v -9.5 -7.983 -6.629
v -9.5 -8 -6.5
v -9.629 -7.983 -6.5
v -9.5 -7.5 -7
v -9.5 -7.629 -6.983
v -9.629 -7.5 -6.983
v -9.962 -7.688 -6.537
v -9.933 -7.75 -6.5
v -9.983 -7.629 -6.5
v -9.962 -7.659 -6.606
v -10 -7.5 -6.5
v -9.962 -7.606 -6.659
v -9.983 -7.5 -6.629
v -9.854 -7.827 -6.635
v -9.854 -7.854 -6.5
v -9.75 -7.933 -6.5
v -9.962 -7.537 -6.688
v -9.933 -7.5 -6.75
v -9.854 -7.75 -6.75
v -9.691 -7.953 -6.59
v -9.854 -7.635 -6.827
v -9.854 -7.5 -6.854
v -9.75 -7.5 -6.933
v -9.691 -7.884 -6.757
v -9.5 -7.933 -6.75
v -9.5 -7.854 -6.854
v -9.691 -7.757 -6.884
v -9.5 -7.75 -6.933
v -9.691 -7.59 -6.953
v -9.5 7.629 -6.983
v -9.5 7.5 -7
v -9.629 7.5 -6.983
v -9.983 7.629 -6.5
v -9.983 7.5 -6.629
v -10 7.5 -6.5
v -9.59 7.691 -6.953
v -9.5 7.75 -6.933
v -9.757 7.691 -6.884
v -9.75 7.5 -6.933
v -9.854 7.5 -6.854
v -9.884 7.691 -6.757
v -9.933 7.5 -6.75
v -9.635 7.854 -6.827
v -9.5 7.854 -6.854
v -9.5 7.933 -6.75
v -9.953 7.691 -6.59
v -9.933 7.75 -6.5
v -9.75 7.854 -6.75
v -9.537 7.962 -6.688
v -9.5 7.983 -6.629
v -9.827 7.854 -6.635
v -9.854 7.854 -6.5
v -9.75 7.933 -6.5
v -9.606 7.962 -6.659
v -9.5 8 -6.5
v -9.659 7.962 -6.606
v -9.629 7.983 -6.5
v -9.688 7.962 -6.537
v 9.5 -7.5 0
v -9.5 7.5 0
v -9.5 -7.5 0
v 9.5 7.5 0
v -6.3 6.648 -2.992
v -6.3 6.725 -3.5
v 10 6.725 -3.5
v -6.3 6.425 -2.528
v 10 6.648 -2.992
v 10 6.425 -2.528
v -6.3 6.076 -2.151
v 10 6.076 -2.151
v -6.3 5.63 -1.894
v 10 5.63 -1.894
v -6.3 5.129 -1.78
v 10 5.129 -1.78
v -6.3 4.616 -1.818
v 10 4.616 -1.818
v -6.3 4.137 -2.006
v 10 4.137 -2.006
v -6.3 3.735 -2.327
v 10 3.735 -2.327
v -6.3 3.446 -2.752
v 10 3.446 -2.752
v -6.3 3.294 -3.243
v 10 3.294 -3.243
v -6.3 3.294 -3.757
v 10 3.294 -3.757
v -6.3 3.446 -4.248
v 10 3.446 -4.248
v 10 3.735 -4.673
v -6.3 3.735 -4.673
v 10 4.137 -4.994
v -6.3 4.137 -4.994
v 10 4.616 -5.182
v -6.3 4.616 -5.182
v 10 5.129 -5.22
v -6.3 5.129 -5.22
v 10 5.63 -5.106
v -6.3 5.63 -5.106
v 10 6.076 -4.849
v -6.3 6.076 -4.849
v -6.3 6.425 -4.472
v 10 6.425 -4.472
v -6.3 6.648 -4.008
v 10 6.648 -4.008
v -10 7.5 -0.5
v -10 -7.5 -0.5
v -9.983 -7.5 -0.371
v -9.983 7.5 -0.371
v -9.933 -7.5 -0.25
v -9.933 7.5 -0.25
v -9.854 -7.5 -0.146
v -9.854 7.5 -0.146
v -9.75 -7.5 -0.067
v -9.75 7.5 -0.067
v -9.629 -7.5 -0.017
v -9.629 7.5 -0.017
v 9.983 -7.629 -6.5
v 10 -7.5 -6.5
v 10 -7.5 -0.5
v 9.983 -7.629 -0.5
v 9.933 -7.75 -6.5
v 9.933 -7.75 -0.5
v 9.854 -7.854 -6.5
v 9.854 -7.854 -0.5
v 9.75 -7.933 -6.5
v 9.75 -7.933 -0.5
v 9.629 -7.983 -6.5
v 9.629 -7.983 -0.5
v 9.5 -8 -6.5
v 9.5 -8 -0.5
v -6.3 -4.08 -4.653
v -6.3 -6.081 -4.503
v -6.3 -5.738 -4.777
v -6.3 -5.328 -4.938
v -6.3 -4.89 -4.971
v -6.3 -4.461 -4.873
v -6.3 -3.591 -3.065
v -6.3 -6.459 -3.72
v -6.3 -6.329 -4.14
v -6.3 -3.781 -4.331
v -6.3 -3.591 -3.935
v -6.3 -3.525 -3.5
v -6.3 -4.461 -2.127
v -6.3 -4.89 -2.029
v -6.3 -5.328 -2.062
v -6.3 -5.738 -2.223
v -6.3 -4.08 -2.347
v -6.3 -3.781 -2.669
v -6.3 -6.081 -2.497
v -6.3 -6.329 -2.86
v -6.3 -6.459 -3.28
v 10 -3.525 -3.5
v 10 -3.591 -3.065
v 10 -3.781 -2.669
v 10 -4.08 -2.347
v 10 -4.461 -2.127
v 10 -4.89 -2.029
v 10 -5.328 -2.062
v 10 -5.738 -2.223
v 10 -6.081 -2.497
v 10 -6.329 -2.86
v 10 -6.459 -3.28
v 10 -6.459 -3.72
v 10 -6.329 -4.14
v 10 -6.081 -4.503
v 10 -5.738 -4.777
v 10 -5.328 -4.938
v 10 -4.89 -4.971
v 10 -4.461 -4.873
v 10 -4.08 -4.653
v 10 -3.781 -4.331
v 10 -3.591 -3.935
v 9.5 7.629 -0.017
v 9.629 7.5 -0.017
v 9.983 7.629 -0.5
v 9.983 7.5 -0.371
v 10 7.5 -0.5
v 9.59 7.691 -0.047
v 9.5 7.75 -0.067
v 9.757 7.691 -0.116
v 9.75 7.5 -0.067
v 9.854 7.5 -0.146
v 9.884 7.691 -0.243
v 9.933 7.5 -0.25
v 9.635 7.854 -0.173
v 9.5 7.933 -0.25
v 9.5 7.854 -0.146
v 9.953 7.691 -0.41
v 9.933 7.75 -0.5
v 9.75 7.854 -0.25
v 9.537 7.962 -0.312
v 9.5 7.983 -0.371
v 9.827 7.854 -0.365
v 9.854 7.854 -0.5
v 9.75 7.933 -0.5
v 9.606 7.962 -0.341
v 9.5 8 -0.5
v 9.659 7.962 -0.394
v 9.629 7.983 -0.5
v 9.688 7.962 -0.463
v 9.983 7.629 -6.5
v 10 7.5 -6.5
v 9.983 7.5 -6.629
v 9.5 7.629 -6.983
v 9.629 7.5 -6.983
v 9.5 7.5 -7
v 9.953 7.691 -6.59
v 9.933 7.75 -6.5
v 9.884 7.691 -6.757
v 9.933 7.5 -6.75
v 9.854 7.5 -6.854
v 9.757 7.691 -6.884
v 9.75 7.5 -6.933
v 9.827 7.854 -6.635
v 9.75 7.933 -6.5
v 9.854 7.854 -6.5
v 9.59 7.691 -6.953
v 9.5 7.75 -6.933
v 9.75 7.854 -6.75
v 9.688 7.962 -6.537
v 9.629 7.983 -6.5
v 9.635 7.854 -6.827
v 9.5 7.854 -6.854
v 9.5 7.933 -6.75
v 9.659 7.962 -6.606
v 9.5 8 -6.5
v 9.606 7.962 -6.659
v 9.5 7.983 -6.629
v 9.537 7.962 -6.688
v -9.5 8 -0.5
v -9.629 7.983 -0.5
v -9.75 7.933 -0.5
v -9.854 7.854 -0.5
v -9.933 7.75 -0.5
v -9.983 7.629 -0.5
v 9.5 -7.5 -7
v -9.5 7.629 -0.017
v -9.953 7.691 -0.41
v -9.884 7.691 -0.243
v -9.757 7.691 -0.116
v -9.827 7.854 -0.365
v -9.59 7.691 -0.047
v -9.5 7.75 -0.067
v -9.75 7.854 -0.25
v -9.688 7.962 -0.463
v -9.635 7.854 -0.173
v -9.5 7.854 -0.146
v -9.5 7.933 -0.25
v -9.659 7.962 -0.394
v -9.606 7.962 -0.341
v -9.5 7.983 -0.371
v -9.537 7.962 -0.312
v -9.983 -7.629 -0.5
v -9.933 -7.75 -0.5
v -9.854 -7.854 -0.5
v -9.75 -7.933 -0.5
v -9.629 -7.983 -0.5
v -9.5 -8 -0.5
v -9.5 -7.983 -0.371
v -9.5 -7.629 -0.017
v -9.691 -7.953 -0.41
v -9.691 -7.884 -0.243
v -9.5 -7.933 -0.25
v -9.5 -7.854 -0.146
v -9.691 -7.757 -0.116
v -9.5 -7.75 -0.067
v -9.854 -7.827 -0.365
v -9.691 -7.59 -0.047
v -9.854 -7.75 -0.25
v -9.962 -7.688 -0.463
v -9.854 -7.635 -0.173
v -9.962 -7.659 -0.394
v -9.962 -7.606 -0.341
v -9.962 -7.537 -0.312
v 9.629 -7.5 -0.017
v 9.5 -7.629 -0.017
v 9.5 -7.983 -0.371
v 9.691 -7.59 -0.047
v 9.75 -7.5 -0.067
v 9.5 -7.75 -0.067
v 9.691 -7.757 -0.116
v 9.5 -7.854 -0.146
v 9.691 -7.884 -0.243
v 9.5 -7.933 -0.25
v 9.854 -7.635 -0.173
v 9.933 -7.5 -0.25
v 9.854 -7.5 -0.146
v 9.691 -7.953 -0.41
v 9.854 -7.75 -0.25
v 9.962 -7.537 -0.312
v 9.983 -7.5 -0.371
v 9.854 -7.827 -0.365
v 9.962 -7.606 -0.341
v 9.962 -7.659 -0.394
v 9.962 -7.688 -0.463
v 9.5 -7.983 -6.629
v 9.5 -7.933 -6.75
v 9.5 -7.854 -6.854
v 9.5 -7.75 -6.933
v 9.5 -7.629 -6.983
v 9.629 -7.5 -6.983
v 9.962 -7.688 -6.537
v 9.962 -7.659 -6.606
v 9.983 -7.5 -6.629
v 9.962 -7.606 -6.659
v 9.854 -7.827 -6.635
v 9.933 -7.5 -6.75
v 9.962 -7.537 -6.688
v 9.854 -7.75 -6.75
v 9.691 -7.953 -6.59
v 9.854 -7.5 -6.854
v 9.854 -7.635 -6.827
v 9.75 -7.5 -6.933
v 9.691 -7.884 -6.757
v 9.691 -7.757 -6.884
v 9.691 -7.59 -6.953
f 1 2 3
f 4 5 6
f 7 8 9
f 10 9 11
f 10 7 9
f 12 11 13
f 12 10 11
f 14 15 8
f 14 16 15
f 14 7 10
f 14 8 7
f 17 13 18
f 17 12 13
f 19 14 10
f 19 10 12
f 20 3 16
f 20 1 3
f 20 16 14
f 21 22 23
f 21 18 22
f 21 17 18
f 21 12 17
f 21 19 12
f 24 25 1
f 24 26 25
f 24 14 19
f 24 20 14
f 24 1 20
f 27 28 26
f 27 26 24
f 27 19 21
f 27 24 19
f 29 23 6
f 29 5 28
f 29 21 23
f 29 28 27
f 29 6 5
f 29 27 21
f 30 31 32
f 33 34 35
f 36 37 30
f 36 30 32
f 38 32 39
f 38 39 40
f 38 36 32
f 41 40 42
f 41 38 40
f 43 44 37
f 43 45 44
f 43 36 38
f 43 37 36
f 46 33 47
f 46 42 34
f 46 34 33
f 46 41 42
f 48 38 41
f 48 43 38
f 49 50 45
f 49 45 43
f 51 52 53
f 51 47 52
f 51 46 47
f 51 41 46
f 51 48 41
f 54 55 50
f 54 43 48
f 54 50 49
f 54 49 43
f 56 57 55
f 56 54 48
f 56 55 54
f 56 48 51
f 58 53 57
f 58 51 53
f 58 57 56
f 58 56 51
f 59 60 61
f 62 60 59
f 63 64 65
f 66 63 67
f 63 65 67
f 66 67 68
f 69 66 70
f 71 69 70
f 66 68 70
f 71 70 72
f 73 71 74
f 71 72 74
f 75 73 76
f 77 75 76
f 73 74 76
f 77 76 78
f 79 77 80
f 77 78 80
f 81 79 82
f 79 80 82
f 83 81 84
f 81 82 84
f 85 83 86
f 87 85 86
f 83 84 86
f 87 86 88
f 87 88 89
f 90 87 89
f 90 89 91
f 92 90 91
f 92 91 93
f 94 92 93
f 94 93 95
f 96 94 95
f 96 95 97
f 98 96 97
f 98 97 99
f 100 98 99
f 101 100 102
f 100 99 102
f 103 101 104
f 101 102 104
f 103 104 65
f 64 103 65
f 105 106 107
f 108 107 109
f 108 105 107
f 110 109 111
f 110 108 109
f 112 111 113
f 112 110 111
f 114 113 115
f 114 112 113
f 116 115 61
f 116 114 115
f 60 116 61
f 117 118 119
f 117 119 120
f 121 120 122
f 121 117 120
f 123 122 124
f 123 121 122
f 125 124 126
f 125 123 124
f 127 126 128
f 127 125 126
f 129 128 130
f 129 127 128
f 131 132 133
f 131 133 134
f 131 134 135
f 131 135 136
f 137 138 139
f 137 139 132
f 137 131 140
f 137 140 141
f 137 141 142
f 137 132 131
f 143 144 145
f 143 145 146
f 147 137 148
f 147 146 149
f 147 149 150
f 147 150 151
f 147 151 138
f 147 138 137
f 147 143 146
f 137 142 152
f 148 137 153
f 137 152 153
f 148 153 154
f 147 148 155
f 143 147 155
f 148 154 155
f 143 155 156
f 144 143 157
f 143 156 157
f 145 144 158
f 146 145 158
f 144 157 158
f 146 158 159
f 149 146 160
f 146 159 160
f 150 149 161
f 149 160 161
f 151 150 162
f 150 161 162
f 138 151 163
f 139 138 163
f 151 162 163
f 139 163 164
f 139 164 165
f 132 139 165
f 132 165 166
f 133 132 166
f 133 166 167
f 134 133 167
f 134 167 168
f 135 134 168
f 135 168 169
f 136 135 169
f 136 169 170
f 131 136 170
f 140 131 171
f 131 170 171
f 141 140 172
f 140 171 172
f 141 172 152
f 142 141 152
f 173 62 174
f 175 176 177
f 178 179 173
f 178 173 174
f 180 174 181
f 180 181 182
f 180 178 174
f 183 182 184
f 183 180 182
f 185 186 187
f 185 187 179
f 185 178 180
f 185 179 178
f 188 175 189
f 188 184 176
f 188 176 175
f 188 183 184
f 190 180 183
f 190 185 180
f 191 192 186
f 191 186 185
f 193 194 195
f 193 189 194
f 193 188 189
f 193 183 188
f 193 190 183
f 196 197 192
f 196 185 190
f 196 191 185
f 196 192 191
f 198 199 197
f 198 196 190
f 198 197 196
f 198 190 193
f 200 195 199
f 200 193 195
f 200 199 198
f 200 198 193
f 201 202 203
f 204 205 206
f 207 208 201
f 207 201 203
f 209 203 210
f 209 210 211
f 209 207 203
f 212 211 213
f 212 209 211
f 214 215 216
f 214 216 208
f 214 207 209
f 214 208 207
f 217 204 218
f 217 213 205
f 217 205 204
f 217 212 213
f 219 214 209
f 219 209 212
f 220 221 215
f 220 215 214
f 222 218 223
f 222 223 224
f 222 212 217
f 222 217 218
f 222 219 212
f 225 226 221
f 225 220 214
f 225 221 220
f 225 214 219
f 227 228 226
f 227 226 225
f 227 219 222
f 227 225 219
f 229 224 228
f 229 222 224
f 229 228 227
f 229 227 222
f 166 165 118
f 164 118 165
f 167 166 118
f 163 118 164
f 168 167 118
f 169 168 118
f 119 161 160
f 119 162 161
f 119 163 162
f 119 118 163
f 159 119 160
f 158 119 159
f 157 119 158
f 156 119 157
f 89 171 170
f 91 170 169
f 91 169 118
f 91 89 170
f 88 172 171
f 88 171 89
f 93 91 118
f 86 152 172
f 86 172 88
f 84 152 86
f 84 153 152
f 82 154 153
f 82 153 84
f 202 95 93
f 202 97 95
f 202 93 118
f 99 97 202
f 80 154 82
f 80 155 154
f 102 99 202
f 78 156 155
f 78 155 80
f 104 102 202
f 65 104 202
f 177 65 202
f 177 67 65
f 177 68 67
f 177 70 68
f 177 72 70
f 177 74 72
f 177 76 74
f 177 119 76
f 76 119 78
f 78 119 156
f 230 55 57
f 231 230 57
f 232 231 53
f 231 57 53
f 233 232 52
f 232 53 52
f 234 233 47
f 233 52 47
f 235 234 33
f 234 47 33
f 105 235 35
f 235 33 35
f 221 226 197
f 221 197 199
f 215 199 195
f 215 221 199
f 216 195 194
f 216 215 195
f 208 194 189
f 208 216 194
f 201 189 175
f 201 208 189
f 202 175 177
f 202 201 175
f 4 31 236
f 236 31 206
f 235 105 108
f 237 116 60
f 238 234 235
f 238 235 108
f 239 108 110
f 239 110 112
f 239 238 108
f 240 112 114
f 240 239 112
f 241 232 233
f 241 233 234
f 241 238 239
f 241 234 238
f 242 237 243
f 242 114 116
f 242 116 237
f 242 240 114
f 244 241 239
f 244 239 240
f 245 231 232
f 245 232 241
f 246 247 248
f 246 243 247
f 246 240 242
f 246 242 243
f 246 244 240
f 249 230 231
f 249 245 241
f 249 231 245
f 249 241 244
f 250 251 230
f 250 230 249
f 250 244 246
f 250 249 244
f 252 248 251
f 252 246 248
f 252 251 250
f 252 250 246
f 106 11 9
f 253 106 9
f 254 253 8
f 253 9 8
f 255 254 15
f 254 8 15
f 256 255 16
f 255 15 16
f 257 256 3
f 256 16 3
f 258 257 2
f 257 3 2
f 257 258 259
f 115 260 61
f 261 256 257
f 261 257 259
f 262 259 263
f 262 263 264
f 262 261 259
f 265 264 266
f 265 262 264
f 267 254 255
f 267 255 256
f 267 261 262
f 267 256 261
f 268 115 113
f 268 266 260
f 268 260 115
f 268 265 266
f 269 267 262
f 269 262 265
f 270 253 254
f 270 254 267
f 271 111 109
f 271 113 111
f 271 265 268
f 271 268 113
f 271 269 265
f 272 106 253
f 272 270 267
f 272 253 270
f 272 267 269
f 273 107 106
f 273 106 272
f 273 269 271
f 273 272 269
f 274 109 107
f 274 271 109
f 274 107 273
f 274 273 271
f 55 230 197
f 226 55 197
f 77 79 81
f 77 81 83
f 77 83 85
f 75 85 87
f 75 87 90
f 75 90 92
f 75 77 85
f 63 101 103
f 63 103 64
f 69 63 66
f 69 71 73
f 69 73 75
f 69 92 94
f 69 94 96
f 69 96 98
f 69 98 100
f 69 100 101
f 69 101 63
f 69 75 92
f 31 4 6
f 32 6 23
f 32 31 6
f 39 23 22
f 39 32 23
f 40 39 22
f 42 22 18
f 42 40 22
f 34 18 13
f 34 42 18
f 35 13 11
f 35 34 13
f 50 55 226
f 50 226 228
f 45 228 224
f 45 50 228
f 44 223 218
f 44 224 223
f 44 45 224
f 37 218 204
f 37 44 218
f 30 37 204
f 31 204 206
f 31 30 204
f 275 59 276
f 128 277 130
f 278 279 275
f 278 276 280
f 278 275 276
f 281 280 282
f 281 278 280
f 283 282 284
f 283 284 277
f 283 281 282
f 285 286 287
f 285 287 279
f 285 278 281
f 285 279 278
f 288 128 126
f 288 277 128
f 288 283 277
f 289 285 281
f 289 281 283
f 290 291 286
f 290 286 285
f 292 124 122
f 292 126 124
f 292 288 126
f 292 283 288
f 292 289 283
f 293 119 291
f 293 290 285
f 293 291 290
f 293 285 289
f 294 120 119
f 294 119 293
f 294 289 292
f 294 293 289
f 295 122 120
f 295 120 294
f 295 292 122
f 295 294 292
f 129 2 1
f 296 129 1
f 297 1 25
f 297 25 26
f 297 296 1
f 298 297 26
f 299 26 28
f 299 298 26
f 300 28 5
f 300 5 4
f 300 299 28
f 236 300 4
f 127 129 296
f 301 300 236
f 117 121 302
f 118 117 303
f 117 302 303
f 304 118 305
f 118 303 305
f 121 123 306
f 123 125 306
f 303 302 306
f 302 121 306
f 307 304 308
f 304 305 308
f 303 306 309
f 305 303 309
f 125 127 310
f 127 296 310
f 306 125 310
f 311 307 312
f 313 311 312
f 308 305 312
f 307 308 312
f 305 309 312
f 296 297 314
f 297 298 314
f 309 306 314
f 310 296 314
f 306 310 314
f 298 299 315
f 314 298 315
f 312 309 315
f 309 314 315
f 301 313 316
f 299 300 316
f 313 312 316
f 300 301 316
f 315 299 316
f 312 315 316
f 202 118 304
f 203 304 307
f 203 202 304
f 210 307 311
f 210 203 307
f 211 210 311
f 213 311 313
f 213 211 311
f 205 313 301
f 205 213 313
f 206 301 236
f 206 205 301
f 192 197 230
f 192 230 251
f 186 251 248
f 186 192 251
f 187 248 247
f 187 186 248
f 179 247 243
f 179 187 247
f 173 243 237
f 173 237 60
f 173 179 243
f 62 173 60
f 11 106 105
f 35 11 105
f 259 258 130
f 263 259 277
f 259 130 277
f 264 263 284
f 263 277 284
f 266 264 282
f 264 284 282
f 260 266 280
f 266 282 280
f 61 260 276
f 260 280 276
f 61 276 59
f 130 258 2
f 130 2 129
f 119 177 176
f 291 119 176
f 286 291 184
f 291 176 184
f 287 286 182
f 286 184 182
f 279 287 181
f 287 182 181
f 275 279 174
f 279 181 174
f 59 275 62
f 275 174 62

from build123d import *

# Parameters (mm, degrees)
F0_W         = 20
F0_H         = 16
F1_DEPTH     = 7
F2_R         = 0.5
F3_T1_DEPTH  = 22.5
F3_T3_DEPTH  = 16.75
F3_T5_DEPTH  = 6
F3_S9_W      = 0.5
F3_S9_H      = 0.5
F3_T10_DEPTH = 0.5
F3_S15_W     = 0.5
F3_S15_H     = 0.5
F3_T16_DEPTH = 0.5
F3_T20_ANGLE = 90
F3_T22_ANGLE = 90
F4_T1_DEPTH  = 6
F4_S5_W      = 0.5
F4_S5_H      = 0.5
F4_T6_DEPTH  = 0.5
F4_S11_W     = 0.5
F4_S11_H     = 0.5
F4_T12_DEPTH = 0.5
F5_T1_DEPTH  = 6
F5_S5_W      = 0.5
F5_S5_H      = 0.5
F5_T6_DEPTH  = 0.5
F5_S11_W     = 0.5
F5_S11_H     = 0.5
F5_T12_DEPTH = 0.5
F6_R         = 1.475
F6_R_2       = 1.725
F7_DEPTH     = 16.3


# Not quite as in the source:
# - a fillet or chamfer that OpenCascade refuses, or shapes differently, is made with other operations: its cross-section is extruded or revolved along the edge and cut away or added


with BuildPart() as f1:
    # F0 (on Top) → F1 (new body)
    with BuildSketch(Plane.XY):
        Rectangle(F0_W, F0_H)
    extrude(amount=-F1_DEPTH)

    # F2
    f2_edges = [f1.edges().sort_by_distance(p)[0] for p in [
        (0, 8, 0),
        (-10, 0, 0),
        (0, -8, 0),
        (10, 0, 0),
        (0, -8, -7),
    ]]
    fillet(f2_edges, radius=F2_R)

    # F3: fillet of radius 0.5 on 4 edges, made by hand

    # F3_s2 → F3_t1 (cut)
    with BuildSketch(Plane.YZ.offset(-11.25)):
        with BuildLine():
            ThreePointArc((8, -6.5), (7.8535533906, -6.8535533906), (7.5, -7))
            Line((7.5, -7), (8, -7))
            Line((8, -7), (8, -6.5))
        make_face()
    extrude(amount=F3_T1_DEPTH, mode=Mode.SUBTRACT)

    # F3_s4 → F3_t3 (cut)
    with BuildSketch(Plane.XZ.offset(-9.25)):
        with BuildLine():
            ThreePointArc((-9.5, -7), (-9.8535533906, -6.8535533906), (-10, -6.5))
            Line((-10, -6.5), (-10, -7))
            Line((-10, -7), (-9.5, -7))
        make_face()
        with BuildLine():
            ThreePointArc((10, -6.5), (9.8535533906, -6.8535533906), (9.5, -7))
            Line((9.5, -7), (10, -7))
            Line((10, -7), (10, -6.5))
        make_face()
    extrude(amount=F3_T3_DEPTH, mode=Mode.SUBTRACT)

    # F3_s6 → F3_t5 (cut)
    with BuildSketch(Plane.XY.offset(-6.5)):
        with BuildLine():
            ThreePointArc((10, -7.5), (9.8535533906, -7.8535533906), (9.5, -8))
            Line((9.5, -8), (10, -8))
            Line((10, -8), (10, -7.5))
        make_face()
        with BuildLine():
            ThreePointArc((-10, -7.5), (-9.8535533906, -7.8535533906), (-9.5, -8))
            Line((-9.5, -8), (-10, -8))
            Line((-10, -8), (-10, -7.5))
        make_face()
    extrude(amount=F3_T5_DEPTH, mode=Mode.SUBTRACT)


with BuildPart() as f3_tool8:
    # F3_s9 → F3_t10 (new body)
    with BuildSketch(Plane.YZ.offset(9.5)):
        with Locations((-7.75, -0.25)):
            Rectangle(F3_S9_W, F3_S9_H)
    extrude(amount=F3_T10_DEPTH)

    # F3_s11 → F3_t12 (revolve, cut)
    with BuildSketch(Plane(origin=(9.5, -7.5, -0.5), x_dir=(0, 0.7071067812, -0.7071067812), z_dir=(0, -0.7071067812, -0.7071067812))):
        with BuildLine():
            ThreePointArc((0, -0.5), (0.5, 0), (0, 0.5))
            Line((0, 0.5), (0, -0.5))
        make_face()
    revolve(axis=Axis((9.5, -7.5, -0.5), (1, 0, 0)), mode=Mode.SUBTRACT)


with BuildPart() as f1_1:
    add(f1.part)

    # F3_t7: cut F3_tool8
    add(f3_tool8.part, mode=Mode.SUBTRACT)


with BuildPart() as f3_tool14:
    # F3_s15 → F3_t16 (new body)
    with BuildSketch(Plane.YZ.offset(-9.5)):
        with Locations((-7.75, -0.25)):
            Rectangle(F3_S15_W, F3_S15_H)
    extrude(amount=-F3_T16_DEPTH)

    # F3_s17 → F3_t18 (revolve, cut)
    with BuildSketch(Plane(origin=(-9.5, -7.5, -0.5), x_dir=(0, 0.7071067812, -0.7071067812), z_dir=(0, 0.7071067812, 0.7071067812))):
        with BuildLine():
            ThreePointArc((0, -0.5), (0.5, 0), (0, 0.5))
            Line((0, 0.5), (0, -0.5))
        make_face()
    revolve(axis=Axis((-9.5, -7.5, -0.5), (-1, 0, 0)), mode=Mode.SUBTRACT)


with BuildPart() as f1_2:
    add(f1_1.part)

    # F3_t13: cut F3_tool14
    add(f3_tool14.part, mode=Mode.SUBTRACT)

    # F3_s19 → F3_t20 (revolve, cut)
    with BuildSketch(Plane.XY.offset(-6.5)):
        with BuildLine():
            ThreePointArc((10, -7.5), (9.8535533906, -7.8535533906), (9.5, -8))
            Line((9.5, -8), (10, -8))
            Line((10, -8), (10, -7.5))
        make_face()
    revolve(axis=Axis((10, -7.5, -6.5), (1, 0, 0)), revolution_arc=F3_T20_ANGLE, mode=Mode.SUBTRACT)

    # F3_s21 → F3_t22 (revolve, cut)
    with BuildSketch(Plane.XY.offset(-6.5)):
        with BuildLine():
            ThreePointArc((-10, -7.5), (-9.8535533906, -7.8535533906), (-9.5, -8))
            Line((-9.5, -8), (-10, -8))
            Line((-10, -8), (-10, -7.5))
        make_face()
    revolve(axis=Axis((-10, -7.5, -6.5), (1, 0, 0)), revolution_arc=F3_T22_ANGLE, mode=Mode.SUBTRACT)

    # F4: fillet of radius 0.5 on 1 edges, made by hand

    # F4_s2 → F4_t1 (cut)
    with BuildSketch(Plane.XY.offset(-6.5)):
        with BuildLine():
            ThreePointArc((-9.5, 8), (-9.8535533906, 7.8535533906), (-10, 7.5))
            Line((-10, 7.5), (-10, 8))
            Line((-10, 8), (-9.5, 8))
        make_face()
    extrude(amount=F4_T1_DEPTH, mode=Mode.SUBTRACT)


with BuildPart() as f4_tool4:
    # F4_s5 → F4_t6 (new body)
    with BuildSketch(Plane.XZ.offset(-7.5)):
        with Locations((-9.75, -0.25)):
            Rectangle(F4_S5_W, F4_S5_H)
    extrude(amount=-F4_T6_DEPTH)

    # F4_s7 → F4_t8 (revolve, cut)
    with BuildSketch(Plane(origin=(-9.5, 7.5, -0.5), x_dir=(0.7071067812, 0, -0.7071067812), z_dir=(0.7071067812, 0, 0.7071067812))):
        with BuildLine():
            ThreePointArc((0, -0.5), (0.5, 0), (0, 0.5))
            Line((0, 0.5), (0, -0.5))
        make_face()
    revolve(axis=Axis((-9.5, 7.5, -0.5), (0, 1, 0)), mode=Mode.SUBTRACT)


with BuildPart() as f1_3:
    add(f1_2.part)

    # F4_t3: cut F4_tool4
    add(f4_tool4.part, mode=Mode.SUBTRACT)


with BuildPart() as f4_tool10:
    # F4_s11 → F4_t12 (new body)
    with BuildSketch(Plane.XZ.offset(-7.5)):
        with Locations((-9.75, -6.75)):
            Rectangle(F4_S11_W, F4_S11_H)
    extrude(amount=-F4_T12_DEPTH)

    # F4_s13 → F4_t14 (revolve, cut)
    with BuildSketch(Plane(origin=(-9.5, 7.5, -6.5), x_dir=(0.7071067812, 0, 0.7071067812), z_dir=(-0.7071067812, 0, 0.7071067812))):
        with BuildLine():
            ThreePointArc((0, -0.5), (0.5, 0), (0, 0.5))
            Line((0, 0.5), (0, -0.5))
        make_face()
    revolve(axis=Axis((-9.5, 7.5, -6.5), (0, 1, 0)), mode=Mode.SUBTRACT)


with BuildPart() as f1_4:
    add(f1_3.part)

    # F4_t9: cut F4_tool10
    add(f4_tool10.part, mode=Mode.SUBTRACT)

    # F5: fillet of radius 0.5 on 1 edges, made by hand

    # F5_s2 → F5_t1 (cut)
    with BuildSketch(Plane.XY.offset(-6.5)):
        with BuildLine():
            ThreePointArc((9.5, 8), (9.8535533906, 7.8535533906), (10, 7.5))
            Line((10, 7.5), (10, 8))
            Line((10, 8), (9.5, 8))
        make_face()
    extrude(amount=F5_T1_DEPTH, mode=Mode.SUBTRACT)


with BuildPart() as f5_tool4:
    # F5_s5 → F5_t6 (new body)
    with BuildSketch(Plane.XZ.offset(-7.5)):
        with Locations((9.75, -0.25)):
            Rectangle(F5_S5_W, F5_S5_H)
    extrude(amount=-F5_T6_DEPTH)

    # F5_s7 → F5_t8 (revolve, cut)
    with BuildSketch(Plane(origin=(9.5, 7.5, -0.5), x_dir=(-0.7071067812, 0, -0.7071067812), z_dir=(0.7071067812, 0, -0.7071067812))):
        with BuildLine():
            ThreePointArc((0, -0.5), (0.5, 0), (0, 0.5))
            Line((0, 0.5), (0, -0.5))
        make_face()
    revolve(axis=Axis((9.5, 7.5, -0.5), (0, 1, 0)), mode=Mode.SUBTRACT)


with BuildPart() as f1_5:
    add(f1_4.part)

    # F5_t3: cut F5_tool4
    add(f5_tool4.part, mode=Mode.SUBTRACT)


with BuildPart() as f5_tool10:
    # F5_s11 → F5_t12 (new body)
    with BuildSketch(Plane.XZ.offset(-7.5)):
        with Locations((9.75, -6.75)):
            Rectangle(F5_S11_W, F5_S11_H)
    extrude(amount=-F5_T12_DEPTH)

    # F5_s13 → F5_t14 (revolve, cut)
    with BuildSketch(Plane(origin=(9.5, 7.5, -6.5), x_dir=(-0.7071067812, 0, 0.7071067812), z_dir=(-0.7071067812, 0, -0.7071067812))):
        with BuildLine():
            ThreePointArc((0, -0.5), (0.5, 0), (0, 0.5))
            Line((0, 0.5), (0, -0.5))
        make_face()
    revolve(axis=Axis((9.5, 7.5, -6.5), (0, 1, 0)), mode=Mode.SUBTRACT)


with BuildPart() as f1_6:
    add(f1_5.part)

    # F5_t9: cut F5_tool10
    add(f5_tool10.part, mode=Mode.SUBTRACT)

    # F6 (on face) → F7 (cut)
    with BuildSketch(Plane.YZ.offset(10)):
        with Locations((-5, -3.5)):
            Circle(F6_R)
        with Locations((5, -3.5)):
            Circle(F6_R_2)
    extrude(amount=-F7_DEPTH, mode=Mode.SUBTRACT)


solid = f1_6.part
